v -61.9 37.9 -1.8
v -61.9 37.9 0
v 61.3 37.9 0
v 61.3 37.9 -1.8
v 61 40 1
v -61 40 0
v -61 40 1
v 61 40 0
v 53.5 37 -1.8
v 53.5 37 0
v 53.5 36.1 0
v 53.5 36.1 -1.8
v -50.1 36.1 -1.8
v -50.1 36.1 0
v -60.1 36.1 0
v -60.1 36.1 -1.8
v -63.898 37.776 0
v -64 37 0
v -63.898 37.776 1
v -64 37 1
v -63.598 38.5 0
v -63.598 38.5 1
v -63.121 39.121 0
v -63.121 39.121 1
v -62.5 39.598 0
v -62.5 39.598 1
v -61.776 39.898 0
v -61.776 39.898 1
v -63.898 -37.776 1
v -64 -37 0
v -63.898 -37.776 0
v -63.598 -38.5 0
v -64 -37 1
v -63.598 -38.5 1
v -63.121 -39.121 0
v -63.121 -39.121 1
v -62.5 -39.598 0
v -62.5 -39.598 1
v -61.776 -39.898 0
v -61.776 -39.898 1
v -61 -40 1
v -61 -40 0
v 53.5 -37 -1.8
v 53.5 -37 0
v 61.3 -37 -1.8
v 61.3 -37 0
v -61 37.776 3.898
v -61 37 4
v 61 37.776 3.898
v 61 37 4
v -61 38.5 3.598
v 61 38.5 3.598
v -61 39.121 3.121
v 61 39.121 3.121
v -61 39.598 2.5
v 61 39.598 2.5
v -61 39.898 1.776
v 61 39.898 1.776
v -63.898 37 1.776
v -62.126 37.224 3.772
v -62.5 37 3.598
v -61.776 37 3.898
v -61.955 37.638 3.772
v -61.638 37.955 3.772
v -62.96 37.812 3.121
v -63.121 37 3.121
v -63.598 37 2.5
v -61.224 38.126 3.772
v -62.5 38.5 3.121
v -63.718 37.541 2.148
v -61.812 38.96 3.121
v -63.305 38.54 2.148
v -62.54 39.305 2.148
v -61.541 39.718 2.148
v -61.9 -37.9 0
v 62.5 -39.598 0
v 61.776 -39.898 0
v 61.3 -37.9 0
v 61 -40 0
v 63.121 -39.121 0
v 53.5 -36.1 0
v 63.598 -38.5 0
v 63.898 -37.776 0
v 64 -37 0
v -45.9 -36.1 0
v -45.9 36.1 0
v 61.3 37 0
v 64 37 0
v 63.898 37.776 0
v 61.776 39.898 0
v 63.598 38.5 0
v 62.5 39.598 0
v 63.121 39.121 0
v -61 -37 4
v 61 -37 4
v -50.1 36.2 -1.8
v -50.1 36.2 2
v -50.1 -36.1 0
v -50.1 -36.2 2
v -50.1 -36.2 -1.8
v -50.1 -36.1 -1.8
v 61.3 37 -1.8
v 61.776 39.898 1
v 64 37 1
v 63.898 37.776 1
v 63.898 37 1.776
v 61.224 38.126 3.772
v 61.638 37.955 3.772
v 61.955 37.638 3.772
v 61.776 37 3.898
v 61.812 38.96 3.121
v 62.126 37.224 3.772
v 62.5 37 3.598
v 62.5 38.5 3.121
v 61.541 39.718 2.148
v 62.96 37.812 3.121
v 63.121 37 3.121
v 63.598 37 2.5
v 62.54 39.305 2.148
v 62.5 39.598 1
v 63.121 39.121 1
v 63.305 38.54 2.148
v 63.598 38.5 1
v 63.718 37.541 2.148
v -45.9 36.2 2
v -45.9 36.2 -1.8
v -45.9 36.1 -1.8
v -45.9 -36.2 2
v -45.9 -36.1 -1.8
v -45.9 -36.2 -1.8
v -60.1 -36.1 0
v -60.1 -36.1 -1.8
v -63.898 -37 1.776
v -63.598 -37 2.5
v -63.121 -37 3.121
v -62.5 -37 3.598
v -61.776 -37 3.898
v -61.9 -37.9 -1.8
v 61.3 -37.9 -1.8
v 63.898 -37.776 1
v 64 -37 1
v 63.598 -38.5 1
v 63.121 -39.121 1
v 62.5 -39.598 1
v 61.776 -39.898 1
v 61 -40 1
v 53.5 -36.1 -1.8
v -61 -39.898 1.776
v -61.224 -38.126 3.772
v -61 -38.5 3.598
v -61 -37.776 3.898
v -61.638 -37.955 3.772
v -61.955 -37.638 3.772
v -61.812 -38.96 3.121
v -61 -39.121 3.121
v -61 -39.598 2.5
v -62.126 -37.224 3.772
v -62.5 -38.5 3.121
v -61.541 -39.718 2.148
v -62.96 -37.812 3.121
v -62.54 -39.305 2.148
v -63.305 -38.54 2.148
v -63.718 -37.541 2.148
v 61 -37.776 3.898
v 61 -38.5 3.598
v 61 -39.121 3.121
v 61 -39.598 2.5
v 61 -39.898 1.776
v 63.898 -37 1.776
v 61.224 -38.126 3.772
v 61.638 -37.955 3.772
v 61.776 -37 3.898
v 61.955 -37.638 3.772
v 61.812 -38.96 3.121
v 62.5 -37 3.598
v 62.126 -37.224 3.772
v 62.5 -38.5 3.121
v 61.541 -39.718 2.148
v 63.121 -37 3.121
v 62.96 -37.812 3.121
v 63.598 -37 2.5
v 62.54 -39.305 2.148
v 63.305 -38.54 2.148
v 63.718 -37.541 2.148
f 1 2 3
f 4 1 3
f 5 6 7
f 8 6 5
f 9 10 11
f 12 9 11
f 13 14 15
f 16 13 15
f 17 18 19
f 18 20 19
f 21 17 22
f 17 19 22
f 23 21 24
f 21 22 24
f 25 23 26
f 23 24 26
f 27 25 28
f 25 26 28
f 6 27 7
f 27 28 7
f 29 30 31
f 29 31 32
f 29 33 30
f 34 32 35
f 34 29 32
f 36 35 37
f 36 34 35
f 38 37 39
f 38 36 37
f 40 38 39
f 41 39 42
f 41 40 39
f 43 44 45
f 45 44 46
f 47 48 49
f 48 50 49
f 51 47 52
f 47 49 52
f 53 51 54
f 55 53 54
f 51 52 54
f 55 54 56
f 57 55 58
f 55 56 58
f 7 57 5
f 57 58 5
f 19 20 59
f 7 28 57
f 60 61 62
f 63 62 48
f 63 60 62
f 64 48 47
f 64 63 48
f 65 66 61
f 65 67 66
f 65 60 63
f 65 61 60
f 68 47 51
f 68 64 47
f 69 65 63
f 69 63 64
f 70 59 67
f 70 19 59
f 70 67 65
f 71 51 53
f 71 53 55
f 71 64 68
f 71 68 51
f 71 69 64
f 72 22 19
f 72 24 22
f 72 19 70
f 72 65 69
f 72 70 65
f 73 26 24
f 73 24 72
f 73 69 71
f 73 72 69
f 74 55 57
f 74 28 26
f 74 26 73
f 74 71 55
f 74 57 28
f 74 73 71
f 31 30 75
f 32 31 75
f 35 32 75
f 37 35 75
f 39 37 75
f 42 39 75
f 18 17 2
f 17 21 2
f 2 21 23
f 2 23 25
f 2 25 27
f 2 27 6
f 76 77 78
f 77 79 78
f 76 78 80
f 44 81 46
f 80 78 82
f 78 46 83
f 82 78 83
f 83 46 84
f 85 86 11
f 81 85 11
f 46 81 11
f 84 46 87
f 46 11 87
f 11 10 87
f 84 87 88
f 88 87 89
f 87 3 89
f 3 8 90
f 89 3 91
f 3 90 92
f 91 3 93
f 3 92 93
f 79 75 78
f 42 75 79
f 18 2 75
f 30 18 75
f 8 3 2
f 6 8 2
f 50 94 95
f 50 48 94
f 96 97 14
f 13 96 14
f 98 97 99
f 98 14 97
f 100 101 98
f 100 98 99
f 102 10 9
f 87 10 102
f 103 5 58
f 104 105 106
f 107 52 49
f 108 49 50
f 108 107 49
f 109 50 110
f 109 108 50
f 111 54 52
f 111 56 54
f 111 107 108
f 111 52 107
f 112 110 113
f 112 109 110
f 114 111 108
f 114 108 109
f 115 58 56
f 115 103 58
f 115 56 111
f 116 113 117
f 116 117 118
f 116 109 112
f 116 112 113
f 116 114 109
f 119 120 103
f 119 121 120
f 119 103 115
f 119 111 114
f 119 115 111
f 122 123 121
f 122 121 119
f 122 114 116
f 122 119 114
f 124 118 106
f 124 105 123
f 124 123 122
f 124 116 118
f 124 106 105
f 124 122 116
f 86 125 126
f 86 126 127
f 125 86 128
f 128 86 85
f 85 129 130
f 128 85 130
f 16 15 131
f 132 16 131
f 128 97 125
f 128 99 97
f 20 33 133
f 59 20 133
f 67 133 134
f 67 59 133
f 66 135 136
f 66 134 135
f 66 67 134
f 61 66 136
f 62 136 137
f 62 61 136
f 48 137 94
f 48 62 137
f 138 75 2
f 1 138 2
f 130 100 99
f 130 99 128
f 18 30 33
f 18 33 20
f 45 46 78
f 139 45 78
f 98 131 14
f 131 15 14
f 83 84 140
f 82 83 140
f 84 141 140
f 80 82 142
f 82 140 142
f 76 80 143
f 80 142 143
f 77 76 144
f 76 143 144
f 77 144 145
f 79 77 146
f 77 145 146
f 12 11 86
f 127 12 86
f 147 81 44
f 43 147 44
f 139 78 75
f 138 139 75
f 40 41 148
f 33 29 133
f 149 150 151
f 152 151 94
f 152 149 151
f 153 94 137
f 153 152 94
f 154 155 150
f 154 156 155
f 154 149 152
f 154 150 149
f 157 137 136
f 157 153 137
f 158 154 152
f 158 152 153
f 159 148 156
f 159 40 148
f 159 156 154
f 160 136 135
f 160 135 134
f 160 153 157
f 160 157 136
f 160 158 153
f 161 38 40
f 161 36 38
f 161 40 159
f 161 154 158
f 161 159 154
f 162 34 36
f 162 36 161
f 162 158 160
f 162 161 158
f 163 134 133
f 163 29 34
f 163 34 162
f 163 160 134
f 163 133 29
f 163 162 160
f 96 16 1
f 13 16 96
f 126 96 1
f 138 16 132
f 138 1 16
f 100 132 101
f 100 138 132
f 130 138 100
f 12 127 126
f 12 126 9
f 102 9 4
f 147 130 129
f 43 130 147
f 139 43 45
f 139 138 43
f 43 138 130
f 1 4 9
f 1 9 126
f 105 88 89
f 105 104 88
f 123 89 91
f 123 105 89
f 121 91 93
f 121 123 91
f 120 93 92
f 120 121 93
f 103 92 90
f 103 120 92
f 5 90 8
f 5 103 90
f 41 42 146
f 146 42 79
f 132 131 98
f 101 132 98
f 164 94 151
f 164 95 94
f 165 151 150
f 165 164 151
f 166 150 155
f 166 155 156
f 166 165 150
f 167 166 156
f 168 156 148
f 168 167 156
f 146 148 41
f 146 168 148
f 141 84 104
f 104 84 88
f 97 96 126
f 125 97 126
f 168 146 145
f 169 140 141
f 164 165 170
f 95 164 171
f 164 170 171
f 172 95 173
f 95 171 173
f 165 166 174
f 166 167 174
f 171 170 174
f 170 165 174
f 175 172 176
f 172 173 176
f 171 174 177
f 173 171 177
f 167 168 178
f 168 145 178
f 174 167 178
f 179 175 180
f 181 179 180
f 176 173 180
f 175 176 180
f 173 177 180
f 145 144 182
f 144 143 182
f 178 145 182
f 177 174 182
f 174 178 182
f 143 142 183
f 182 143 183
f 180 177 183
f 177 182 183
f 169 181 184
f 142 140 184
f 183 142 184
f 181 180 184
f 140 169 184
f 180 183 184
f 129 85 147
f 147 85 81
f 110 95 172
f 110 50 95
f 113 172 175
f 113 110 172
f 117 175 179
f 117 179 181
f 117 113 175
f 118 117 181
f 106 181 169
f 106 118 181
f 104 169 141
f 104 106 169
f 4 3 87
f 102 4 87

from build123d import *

# Parameters (mm, degrees)
F0_W     = 128
F0_H     = 80
F1_DEPTH = 4
F2_W     = 7.8
F2_H     = 0.9
F2_W_2   = 1.8
F2_H_2   = 72.2
F3_DEPTH = 1.8
F4_W     = 4.2
F4_H     = 72.2
F5_DEPTH = 2
F6_W     = 4.2
F6_H     = 0.1
F7_DEPTH = 3.8
F8_R     = 3


with BuildPart() as f1:
    # F0 (on Top) → F1 (new body)
    with BuildSketch(Plane.XY):
        Rectangle(F0_W, F0_H)
    extrude(amount=F1_DEPTH)

    # F2 (on face) → F3 (join)
    with BuildSketch(Plane(origin=(0, 0, 0), x_dir=(1, 0, 0), z_dir=(0, 0, -1))):
        Polygon((53.5, 37.9), (-61.9, 37.9), (-61.9, 36.1), (-60.1, 36.1), (53.5, 36.1), (53.5, 37), align=None)
        with Locations((57.4, 37.45)):
            Rectangle(F2_W, F2_H)
        with Locations((-61, 0)):
            Rectangle(F2_W_2, F2_H_2)
        Polygon((-60.1, -36.1), (-61.9, -36.1), (-61.9, -37.9), (53.5, -37.9), (53.5, -37), (53.5, -36.1), align=None)
        with Locations((57.4, -37.45)):
            Rectangle(F2_W, F2_H)
    extrude(amount=F3_DEPTH)

    # F4 (on face) → F5 (cut)
    with BuildSketch(Plane(origin=(0, 0, 0), x_dir=(1, 0, 0), z_dir=(0, 0, -1))):
        with Locations((-48, 0)):
            Rectangle(F4_W, F4_H)
    extrude(amount=-F5_DEPTH, mode=Mode.SUBTRACT)

    # F6 (on face) → F7 (cut)
    with BuildSketch(Plane(origin=(0, 0, -1.8), x_dir=(1, 0, 0), z_dir=(0, 0, -1))):
        with Locations((-48, 36.15)):
            Rectangle(F6_W, F6_H)
        with Locations((-48, -36.15)):
            Rectangle(F6_W, F6_H)
    extrude(amount=-F7_DEPTH, mode=Mode.SUBTRACT)

    # F8
    f8_edges = [f1.edges().sort_by_distance(p)[0] for p in [
        (64, -40, 2),
        (64, 40, 2),
        (-64, 40, 2),
        (-64, -40, 2),
        (0, -40, 4),
        (-64, 0, 4),
        (0, 40, 4),
        (64, 0, 4),
    ]]
    fillet(f8_edges, radius=F8_R)


solid = f1.part
